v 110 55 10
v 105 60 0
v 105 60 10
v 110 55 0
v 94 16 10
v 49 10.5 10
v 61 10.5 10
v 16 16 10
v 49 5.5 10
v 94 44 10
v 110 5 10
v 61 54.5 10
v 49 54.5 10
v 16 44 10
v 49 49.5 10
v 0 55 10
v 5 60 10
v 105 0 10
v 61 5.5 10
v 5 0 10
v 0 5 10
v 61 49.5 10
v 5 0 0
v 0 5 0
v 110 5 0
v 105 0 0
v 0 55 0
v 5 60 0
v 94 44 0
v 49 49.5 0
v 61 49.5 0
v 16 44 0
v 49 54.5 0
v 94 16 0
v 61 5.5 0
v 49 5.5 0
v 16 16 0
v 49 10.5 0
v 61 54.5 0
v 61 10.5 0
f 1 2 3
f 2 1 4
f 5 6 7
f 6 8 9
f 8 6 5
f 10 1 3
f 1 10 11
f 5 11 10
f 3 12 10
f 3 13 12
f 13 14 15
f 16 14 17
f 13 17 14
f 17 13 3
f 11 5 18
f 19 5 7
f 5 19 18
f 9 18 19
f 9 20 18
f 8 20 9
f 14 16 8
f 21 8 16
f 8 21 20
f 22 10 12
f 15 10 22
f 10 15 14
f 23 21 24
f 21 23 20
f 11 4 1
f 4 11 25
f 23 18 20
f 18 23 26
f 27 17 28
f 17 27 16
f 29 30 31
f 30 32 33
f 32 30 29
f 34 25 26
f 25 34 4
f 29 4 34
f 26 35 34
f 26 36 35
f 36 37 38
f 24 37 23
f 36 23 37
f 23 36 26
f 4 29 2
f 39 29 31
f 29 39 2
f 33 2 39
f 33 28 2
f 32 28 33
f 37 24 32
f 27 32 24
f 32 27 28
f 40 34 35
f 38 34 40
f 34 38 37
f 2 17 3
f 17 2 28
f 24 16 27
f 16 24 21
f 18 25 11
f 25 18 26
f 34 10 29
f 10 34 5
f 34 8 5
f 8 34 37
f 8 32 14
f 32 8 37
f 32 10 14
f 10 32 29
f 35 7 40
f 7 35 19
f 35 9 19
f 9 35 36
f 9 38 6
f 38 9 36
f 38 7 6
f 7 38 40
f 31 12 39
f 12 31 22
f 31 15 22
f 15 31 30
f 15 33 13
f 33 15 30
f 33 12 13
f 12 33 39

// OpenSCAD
$fn = 32;

// ----------------------------------------------------------------------
// Frame plate: 110 x 60 frame, 16 mm rails
// ----------------------------------------------------------------------

// --- parameters (mm) ---
plate_l = 110;            // plate length, X
plate_w = 60;             // plate width, Y
plate_t = 10;             // plate thickness, Z (extrusion height)
corner_c = 5;             // corner chamfer
frame_bar = 16;           // frame rail width
slot_l = 12;              // adjustment slot length
slot_w = 5;               // adjustment slot width

win_l = plate_l - 2 * frame_bar;  // window length
win_w = plate_w - 2 * frame_bar;  // window width

profile = [[5, 0], [105, 0], [110, 5], [110, 55], [105, 60], [5, 60], [0, 55], [0, 5]];  // primary outline, 8 points, counter clockwise
void_1 = [[16, 16], [94, 16], [94, 44], [16, 44]];  // the window, 4 points
void_2 = [[49, 5.5], [61, 5.5], [61, 10.5], [49, 10.5]];  // adjustment slot, 4 points
void_3 = [[49, 49.5], [61, 49.5], [61, 54.5], [49, 54.5]];  // adjustment slot, 4 points

// --- the one profile operation ---
difference() {
  linear_extrude(height = plate_t) polygon(points = profile);
  translate([0, 0, -1])
    linear_extrude(height = plate_t + 2) polygon(points = void_1);
  translate([0, 0, -1])
    linear_extrude(height = plate_t + 2) polygon(points = void_2);
  translate([0, 0, -1])
    linear_extrude(height = plate_t + 2) polygon(points = void_3);
}
